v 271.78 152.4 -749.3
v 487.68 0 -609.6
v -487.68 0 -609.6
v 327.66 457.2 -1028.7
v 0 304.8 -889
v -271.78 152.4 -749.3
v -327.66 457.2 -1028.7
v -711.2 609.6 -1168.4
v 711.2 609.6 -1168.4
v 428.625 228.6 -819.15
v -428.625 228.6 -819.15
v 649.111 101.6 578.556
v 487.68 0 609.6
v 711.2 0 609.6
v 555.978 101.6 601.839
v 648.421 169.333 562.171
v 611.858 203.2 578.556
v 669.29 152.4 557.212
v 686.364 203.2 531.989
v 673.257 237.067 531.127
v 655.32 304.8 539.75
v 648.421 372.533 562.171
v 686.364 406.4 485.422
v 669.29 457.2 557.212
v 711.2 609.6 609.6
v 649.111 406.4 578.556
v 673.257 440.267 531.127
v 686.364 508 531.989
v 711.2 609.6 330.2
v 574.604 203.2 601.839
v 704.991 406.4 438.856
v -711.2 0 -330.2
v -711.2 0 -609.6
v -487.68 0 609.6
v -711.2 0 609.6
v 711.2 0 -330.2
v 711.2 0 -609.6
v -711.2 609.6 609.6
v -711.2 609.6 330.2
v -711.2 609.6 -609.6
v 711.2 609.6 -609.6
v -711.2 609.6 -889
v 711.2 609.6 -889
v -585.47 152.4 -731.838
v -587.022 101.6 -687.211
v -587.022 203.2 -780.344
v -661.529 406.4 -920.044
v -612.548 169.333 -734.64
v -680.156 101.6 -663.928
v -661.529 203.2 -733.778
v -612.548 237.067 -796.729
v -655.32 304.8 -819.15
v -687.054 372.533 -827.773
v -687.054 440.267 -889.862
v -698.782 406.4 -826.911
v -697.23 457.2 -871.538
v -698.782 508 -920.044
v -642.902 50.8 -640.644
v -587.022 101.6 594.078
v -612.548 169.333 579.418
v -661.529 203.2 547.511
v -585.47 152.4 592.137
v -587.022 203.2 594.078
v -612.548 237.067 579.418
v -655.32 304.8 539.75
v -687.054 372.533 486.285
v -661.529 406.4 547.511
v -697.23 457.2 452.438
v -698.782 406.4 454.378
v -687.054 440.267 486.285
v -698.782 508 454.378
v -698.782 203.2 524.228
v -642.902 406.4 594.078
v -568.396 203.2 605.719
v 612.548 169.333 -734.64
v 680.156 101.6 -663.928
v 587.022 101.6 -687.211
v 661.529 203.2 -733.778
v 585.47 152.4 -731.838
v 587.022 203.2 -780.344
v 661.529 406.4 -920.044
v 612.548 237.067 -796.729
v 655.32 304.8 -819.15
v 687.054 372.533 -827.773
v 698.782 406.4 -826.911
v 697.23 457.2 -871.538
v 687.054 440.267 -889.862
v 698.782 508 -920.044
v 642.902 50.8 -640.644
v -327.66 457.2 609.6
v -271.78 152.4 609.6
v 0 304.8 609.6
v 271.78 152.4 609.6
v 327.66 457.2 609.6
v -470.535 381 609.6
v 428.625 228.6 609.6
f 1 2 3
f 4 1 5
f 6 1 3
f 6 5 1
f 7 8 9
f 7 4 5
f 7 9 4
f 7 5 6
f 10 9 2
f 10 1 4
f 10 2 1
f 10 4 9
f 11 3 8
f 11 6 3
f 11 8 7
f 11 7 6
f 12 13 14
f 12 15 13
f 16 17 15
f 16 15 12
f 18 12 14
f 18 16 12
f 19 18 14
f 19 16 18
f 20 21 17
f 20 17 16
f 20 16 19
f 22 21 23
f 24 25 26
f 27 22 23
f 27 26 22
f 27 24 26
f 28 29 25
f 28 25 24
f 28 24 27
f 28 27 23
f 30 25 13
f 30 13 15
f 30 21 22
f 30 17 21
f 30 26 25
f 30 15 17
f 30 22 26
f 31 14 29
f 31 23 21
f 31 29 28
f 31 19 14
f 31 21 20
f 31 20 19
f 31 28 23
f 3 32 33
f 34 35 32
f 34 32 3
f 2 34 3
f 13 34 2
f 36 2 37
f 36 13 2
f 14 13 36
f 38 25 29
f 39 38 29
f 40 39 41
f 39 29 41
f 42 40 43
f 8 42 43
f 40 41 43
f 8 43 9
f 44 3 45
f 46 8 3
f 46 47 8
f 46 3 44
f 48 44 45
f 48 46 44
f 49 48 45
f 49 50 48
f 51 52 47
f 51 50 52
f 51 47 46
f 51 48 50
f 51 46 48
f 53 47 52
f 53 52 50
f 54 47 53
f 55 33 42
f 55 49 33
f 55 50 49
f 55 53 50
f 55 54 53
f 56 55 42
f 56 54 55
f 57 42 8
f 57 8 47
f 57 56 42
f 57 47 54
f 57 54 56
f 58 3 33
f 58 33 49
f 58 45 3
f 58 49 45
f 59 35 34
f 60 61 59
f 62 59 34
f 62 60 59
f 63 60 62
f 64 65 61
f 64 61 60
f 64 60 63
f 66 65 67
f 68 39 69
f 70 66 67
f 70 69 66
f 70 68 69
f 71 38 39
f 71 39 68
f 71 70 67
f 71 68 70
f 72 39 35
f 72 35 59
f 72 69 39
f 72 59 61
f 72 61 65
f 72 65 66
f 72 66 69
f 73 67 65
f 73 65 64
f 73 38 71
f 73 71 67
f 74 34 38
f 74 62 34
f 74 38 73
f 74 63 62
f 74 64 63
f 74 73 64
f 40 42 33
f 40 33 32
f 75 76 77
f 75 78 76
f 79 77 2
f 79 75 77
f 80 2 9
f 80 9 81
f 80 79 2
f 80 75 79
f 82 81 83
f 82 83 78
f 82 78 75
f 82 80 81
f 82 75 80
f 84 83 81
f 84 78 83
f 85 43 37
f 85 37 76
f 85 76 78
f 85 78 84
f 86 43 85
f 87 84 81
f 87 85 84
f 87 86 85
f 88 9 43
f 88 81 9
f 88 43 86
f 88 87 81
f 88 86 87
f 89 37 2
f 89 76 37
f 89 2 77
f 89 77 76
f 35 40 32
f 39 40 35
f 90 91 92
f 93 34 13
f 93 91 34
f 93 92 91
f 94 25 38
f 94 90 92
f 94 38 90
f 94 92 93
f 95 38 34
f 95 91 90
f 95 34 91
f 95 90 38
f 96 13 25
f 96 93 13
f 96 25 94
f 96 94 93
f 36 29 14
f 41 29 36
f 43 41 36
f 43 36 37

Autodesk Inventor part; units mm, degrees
ref_plane "YZ Plane" through (0, 0, 0) normal (1, 0, 0) x (0, 1, 0)
ref_plane "XY Plane" through (0, 0, 0) normal (0, 0, 1) x (1, 0, 0)
sketch "Sketch1" plane through (0, 0, 0) normal (0, 1, 0) x (-1, 0, 0)
  line L0 (711.2, 609.6) -> (-711.2, 609.6)
  line L1 (-711.2, 609.6) -> (-711.2, -609.6)
  line L2 (-711.2, -609.6) -> (711.2, -609.6)
  line L3 (711.2, -609.6) -> (711.2, 609.6)
  line L4 (0, -853.44) -> (0, 853.44) projected
  line L5 (-995.68, 0) -> (995.68, 0) projected
  line L6 (995.68, 0) -> (-995.68, 0) projected
  line L7 (0, -853.44) -> (0, 853.44) projected
  point P0 (0, 0)
  dimension "d0" = 1422.4
  dimension "d1" = 1219.2
ref_plane "Work Plane1" through (0, 609.6, 0) normal (0, 1, 0) x (-1, 0, 0)
sketch "Sketch2" plane through (0, 609.6, 0) normal (0, 1, 0) x (-1, 0, 0)
  line L0 (711.2, -609.6) -> (711.2, 609.6) projected
  line L1 (711.2, 609.6) -> (-711.2, 609.6) projected
  line L2 (-711.2, 609.6) -> (-711.2, -609.6) projected
  line L3 (711.2, 609.6) -> (-711.2, 609.6)
  line L4 (-711.2, 609.6) -> (-711.2, -609.6)
  line L5 (711.2, -609.6) -> (711.2, 609.6)
  line L6 (711.2, -609.6) -> (711.2, -1168.4)
  line L7 (711.2, -1168.4) -> (-711.2, -1168.4)
  line L8 (-711.2, -1168.4) -> (-711.2, -609.6)
  line L9 (711.2, -1168.4) -> (-711.2, -1168.4)
  line L10 (-711.2, -1168.4) -> (-711.2, 609.6)
  line L11 (-711.2, 609.6) -> (711.2, 609.6)
  line L12 (711.2, 609.6) -> (711.2, -1168.4)
  line L13 (-711.2, 609.6) -> (711.2, 609.6)
  line L14 (711.2, 609.6) -> (711.2, -1168.4)
  line L15 (711.2, -1168.4) -> (-711.2, -1168.4)
  line L16 (-711.2, -1168.4) -> (-711.2, 609.6)
  point P0 (0, 0)
  dimension "d3" = 1422.4
  dimension "d4" = 558.8
loft "Loft1" add profiles "Sketch1", "Sketch2"
properties part number "SouthWestWallBlockAngle"
